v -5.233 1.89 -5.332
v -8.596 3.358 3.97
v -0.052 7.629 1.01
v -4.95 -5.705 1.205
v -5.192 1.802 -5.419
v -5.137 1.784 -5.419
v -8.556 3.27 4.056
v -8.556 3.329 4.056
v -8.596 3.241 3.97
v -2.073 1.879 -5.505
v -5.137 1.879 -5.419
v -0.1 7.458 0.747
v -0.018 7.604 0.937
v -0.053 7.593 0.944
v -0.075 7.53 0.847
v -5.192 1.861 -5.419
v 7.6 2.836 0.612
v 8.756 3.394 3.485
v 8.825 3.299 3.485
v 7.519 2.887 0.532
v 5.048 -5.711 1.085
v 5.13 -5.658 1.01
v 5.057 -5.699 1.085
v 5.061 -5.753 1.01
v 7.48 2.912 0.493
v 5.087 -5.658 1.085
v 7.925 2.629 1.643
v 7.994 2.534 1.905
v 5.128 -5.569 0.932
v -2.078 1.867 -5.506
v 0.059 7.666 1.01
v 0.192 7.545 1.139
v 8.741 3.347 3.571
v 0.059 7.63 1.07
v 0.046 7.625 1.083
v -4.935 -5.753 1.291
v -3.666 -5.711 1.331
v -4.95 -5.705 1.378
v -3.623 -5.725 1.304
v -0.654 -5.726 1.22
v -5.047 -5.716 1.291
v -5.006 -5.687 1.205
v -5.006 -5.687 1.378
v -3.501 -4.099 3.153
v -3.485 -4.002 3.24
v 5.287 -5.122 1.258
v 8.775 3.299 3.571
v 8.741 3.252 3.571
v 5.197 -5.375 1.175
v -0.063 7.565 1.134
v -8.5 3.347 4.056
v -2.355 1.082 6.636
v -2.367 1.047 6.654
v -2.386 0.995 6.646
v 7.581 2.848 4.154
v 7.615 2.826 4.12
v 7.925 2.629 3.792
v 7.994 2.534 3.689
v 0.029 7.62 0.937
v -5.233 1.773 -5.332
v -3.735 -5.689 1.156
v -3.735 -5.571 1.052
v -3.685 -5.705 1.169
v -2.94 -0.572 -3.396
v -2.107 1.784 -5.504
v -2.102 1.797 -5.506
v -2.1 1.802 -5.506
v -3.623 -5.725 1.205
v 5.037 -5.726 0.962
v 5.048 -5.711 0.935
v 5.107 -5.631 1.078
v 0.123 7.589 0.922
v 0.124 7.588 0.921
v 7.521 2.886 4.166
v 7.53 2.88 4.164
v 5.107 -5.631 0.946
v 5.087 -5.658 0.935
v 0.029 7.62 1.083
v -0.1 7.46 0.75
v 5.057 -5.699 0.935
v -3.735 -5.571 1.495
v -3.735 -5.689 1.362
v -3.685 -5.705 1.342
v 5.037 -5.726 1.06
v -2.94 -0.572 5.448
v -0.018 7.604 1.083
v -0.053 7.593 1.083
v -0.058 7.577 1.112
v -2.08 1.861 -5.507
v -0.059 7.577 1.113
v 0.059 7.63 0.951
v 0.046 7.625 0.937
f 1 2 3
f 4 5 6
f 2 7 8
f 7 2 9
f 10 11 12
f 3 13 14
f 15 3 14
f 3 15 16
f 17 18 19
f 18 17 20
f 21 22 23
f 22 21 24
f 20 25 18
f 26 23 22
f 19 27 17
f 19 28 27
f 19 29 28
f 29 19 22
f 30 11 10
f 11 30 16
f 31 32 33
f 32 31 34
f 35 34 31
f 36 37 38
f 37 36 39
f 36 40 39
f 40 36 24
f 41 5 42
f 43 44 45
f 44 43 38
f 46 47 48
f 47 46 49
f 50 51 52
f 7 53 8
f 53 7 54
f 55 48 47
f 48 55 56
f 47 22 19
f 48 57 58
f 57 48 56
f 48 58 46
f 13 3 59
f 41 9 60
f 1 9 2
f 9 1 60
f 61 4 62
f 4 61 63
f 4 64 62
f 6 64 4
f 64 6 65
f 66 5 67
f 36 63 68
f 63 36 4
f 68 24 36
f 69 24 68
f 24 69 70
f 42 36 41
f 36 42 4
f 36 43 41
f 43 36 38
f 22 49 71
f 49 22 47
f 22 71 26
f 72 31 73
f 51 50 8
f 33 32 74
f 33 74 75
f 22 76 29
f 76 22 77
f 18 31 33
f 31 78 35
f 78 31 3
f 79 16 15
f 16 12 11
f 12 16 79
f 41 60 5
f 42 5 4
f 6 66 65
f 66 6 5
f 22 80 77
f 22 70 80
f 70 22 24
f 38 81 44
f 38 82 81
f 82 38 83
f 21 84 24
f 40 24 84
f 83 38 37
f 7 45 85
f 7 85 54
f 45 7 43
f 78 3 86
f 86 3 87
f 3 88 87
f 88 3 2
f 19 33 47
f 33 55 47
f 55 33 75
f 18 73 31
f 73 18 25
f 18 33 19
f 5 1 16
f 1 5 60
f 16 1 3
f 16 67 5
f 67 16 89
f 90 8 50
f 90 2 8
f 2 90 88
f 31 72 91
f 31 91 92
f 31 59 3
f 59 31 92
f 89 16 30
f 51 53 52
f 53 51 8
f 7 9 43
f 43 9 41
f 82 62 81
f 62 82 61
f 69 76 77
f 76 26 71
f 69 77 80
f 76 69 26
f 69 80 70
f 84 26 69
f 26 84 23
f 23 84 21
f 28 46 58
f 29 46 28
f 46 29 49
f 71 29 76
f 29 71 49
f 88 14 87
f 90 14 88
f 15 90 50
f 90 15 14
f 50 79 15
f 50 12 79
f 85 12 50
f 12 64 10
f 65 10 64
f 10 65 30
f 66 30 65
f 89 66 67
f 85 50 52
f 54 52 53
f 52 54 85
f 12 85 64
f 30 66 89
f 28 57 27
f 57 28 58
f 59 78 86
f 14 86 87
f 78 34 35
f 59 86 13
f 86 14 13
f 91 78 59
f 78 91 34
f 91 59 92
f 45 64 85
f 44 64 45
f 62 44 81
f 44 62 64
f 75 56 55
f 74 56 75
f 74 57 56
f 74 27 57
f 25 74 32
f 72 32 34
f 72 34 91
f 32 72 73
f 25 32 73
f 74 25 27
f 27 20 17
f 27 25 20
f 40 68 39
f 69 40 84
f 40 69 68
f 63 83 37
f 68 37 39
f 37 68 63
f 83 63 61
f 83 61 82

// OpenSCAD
// Auto-generated OpenSCAD file

    inner_points = 10*[[-0.36537328936366986, -0.5630248957199848, -0.2041241481408165], [-0.07665632407859727, 0.2534568958636895, -0.7041241461097079], [-0.28588836871909684, -0.06302896737091813, 0.6582482882371564], [0.0028285965659757967, 0.7534528242127562, 0.15824829026826498], [0.5006521103988715, -0.5630692614318152, 0.29587585685699724], [0.7893690756839442, 0.25341253015185916, -0.20412414111189417], [0.5006521161698728, -0.5630692609848701, -0.7041241431430026], [0.6377433254045676, 0.299296152151859, 0.7832482937293753]];

    outer_points = 10*[[0.5030398526543044, -0.5657546721443936, 0.10102420958195456], [0.4844053090391255, 0.18317157791304, -0.5613670839592305], [-0.49656467091517004, -0.5657546721443936, 0.12914531303547902], [-0.515199214530349, 0.18317157791304, -0.533245980505706], [0.021476633683634054, 0.008119969202636801, 0.763417417694344], [0.002842090068455094, 0.7570462192600704, 0.10102612415315894], [0.872517286240693, 0.3299291148283261, 0.34848527687259606], [-0.8515454892055908, 0.3299291148283261, 0.39698700583193464]];

    // Convex hull for inner set (I)
    module inner_hull() {
        hull() {
            for (p = inner_points) {
                translate(p) sphere(r=0.1);
            }
        }
    }

    // Convex hull for outer set (O) minus inner hull (O \ I)
    module outer_minus_inner() {
        difference() {
            hull() {
                for (p = outer_points) {
                    translate(p) sphere(r=0.1);
                }
            }
            inner_hull(); // Subtract inner hull
        }
    }

    // Convex hull for outer set (O) minus all translated inner hulls
    module outer_minus_AllTranslationInner() {
        difference() {
            hull() {
                for (p = outer_points) {
                    translate(p) sphere(r=0.1);
                }
            }
            hull() {
                translate([0,0,50]) inner_hull();
                translate([0,0,-50]) inner_hull();
            }; // Subtract translated inner hulls
        }
    }

    // Difference between outer_minus_inner and outer_minus_AllTranslationInner
    module outer_minus_inner_diff() {
        difference() {
            // Outer minus inner
            difference() {
                hull() {
                    for (p = outer_points) {
                        translate(p) sphere(r=0.1);
                    }
                }
                inner_hull();
            }

            // Subtract Outer minus AllTranslationInner
            difference() {
                hull() {
                    for (p = outer_points) {
                        translate(p) sphere(r=0.1);
                    }
                }
                hull() {
                    translate([0,0,50]) inner_hull();
                    translate([0,0,-50]) inner_hull();
                };
            }
        }
    }

    // Rendering all with colors applied
    color([0, 1, 0, 1]) outer_minus_AllTranslationInner(); // Opaque green
    
